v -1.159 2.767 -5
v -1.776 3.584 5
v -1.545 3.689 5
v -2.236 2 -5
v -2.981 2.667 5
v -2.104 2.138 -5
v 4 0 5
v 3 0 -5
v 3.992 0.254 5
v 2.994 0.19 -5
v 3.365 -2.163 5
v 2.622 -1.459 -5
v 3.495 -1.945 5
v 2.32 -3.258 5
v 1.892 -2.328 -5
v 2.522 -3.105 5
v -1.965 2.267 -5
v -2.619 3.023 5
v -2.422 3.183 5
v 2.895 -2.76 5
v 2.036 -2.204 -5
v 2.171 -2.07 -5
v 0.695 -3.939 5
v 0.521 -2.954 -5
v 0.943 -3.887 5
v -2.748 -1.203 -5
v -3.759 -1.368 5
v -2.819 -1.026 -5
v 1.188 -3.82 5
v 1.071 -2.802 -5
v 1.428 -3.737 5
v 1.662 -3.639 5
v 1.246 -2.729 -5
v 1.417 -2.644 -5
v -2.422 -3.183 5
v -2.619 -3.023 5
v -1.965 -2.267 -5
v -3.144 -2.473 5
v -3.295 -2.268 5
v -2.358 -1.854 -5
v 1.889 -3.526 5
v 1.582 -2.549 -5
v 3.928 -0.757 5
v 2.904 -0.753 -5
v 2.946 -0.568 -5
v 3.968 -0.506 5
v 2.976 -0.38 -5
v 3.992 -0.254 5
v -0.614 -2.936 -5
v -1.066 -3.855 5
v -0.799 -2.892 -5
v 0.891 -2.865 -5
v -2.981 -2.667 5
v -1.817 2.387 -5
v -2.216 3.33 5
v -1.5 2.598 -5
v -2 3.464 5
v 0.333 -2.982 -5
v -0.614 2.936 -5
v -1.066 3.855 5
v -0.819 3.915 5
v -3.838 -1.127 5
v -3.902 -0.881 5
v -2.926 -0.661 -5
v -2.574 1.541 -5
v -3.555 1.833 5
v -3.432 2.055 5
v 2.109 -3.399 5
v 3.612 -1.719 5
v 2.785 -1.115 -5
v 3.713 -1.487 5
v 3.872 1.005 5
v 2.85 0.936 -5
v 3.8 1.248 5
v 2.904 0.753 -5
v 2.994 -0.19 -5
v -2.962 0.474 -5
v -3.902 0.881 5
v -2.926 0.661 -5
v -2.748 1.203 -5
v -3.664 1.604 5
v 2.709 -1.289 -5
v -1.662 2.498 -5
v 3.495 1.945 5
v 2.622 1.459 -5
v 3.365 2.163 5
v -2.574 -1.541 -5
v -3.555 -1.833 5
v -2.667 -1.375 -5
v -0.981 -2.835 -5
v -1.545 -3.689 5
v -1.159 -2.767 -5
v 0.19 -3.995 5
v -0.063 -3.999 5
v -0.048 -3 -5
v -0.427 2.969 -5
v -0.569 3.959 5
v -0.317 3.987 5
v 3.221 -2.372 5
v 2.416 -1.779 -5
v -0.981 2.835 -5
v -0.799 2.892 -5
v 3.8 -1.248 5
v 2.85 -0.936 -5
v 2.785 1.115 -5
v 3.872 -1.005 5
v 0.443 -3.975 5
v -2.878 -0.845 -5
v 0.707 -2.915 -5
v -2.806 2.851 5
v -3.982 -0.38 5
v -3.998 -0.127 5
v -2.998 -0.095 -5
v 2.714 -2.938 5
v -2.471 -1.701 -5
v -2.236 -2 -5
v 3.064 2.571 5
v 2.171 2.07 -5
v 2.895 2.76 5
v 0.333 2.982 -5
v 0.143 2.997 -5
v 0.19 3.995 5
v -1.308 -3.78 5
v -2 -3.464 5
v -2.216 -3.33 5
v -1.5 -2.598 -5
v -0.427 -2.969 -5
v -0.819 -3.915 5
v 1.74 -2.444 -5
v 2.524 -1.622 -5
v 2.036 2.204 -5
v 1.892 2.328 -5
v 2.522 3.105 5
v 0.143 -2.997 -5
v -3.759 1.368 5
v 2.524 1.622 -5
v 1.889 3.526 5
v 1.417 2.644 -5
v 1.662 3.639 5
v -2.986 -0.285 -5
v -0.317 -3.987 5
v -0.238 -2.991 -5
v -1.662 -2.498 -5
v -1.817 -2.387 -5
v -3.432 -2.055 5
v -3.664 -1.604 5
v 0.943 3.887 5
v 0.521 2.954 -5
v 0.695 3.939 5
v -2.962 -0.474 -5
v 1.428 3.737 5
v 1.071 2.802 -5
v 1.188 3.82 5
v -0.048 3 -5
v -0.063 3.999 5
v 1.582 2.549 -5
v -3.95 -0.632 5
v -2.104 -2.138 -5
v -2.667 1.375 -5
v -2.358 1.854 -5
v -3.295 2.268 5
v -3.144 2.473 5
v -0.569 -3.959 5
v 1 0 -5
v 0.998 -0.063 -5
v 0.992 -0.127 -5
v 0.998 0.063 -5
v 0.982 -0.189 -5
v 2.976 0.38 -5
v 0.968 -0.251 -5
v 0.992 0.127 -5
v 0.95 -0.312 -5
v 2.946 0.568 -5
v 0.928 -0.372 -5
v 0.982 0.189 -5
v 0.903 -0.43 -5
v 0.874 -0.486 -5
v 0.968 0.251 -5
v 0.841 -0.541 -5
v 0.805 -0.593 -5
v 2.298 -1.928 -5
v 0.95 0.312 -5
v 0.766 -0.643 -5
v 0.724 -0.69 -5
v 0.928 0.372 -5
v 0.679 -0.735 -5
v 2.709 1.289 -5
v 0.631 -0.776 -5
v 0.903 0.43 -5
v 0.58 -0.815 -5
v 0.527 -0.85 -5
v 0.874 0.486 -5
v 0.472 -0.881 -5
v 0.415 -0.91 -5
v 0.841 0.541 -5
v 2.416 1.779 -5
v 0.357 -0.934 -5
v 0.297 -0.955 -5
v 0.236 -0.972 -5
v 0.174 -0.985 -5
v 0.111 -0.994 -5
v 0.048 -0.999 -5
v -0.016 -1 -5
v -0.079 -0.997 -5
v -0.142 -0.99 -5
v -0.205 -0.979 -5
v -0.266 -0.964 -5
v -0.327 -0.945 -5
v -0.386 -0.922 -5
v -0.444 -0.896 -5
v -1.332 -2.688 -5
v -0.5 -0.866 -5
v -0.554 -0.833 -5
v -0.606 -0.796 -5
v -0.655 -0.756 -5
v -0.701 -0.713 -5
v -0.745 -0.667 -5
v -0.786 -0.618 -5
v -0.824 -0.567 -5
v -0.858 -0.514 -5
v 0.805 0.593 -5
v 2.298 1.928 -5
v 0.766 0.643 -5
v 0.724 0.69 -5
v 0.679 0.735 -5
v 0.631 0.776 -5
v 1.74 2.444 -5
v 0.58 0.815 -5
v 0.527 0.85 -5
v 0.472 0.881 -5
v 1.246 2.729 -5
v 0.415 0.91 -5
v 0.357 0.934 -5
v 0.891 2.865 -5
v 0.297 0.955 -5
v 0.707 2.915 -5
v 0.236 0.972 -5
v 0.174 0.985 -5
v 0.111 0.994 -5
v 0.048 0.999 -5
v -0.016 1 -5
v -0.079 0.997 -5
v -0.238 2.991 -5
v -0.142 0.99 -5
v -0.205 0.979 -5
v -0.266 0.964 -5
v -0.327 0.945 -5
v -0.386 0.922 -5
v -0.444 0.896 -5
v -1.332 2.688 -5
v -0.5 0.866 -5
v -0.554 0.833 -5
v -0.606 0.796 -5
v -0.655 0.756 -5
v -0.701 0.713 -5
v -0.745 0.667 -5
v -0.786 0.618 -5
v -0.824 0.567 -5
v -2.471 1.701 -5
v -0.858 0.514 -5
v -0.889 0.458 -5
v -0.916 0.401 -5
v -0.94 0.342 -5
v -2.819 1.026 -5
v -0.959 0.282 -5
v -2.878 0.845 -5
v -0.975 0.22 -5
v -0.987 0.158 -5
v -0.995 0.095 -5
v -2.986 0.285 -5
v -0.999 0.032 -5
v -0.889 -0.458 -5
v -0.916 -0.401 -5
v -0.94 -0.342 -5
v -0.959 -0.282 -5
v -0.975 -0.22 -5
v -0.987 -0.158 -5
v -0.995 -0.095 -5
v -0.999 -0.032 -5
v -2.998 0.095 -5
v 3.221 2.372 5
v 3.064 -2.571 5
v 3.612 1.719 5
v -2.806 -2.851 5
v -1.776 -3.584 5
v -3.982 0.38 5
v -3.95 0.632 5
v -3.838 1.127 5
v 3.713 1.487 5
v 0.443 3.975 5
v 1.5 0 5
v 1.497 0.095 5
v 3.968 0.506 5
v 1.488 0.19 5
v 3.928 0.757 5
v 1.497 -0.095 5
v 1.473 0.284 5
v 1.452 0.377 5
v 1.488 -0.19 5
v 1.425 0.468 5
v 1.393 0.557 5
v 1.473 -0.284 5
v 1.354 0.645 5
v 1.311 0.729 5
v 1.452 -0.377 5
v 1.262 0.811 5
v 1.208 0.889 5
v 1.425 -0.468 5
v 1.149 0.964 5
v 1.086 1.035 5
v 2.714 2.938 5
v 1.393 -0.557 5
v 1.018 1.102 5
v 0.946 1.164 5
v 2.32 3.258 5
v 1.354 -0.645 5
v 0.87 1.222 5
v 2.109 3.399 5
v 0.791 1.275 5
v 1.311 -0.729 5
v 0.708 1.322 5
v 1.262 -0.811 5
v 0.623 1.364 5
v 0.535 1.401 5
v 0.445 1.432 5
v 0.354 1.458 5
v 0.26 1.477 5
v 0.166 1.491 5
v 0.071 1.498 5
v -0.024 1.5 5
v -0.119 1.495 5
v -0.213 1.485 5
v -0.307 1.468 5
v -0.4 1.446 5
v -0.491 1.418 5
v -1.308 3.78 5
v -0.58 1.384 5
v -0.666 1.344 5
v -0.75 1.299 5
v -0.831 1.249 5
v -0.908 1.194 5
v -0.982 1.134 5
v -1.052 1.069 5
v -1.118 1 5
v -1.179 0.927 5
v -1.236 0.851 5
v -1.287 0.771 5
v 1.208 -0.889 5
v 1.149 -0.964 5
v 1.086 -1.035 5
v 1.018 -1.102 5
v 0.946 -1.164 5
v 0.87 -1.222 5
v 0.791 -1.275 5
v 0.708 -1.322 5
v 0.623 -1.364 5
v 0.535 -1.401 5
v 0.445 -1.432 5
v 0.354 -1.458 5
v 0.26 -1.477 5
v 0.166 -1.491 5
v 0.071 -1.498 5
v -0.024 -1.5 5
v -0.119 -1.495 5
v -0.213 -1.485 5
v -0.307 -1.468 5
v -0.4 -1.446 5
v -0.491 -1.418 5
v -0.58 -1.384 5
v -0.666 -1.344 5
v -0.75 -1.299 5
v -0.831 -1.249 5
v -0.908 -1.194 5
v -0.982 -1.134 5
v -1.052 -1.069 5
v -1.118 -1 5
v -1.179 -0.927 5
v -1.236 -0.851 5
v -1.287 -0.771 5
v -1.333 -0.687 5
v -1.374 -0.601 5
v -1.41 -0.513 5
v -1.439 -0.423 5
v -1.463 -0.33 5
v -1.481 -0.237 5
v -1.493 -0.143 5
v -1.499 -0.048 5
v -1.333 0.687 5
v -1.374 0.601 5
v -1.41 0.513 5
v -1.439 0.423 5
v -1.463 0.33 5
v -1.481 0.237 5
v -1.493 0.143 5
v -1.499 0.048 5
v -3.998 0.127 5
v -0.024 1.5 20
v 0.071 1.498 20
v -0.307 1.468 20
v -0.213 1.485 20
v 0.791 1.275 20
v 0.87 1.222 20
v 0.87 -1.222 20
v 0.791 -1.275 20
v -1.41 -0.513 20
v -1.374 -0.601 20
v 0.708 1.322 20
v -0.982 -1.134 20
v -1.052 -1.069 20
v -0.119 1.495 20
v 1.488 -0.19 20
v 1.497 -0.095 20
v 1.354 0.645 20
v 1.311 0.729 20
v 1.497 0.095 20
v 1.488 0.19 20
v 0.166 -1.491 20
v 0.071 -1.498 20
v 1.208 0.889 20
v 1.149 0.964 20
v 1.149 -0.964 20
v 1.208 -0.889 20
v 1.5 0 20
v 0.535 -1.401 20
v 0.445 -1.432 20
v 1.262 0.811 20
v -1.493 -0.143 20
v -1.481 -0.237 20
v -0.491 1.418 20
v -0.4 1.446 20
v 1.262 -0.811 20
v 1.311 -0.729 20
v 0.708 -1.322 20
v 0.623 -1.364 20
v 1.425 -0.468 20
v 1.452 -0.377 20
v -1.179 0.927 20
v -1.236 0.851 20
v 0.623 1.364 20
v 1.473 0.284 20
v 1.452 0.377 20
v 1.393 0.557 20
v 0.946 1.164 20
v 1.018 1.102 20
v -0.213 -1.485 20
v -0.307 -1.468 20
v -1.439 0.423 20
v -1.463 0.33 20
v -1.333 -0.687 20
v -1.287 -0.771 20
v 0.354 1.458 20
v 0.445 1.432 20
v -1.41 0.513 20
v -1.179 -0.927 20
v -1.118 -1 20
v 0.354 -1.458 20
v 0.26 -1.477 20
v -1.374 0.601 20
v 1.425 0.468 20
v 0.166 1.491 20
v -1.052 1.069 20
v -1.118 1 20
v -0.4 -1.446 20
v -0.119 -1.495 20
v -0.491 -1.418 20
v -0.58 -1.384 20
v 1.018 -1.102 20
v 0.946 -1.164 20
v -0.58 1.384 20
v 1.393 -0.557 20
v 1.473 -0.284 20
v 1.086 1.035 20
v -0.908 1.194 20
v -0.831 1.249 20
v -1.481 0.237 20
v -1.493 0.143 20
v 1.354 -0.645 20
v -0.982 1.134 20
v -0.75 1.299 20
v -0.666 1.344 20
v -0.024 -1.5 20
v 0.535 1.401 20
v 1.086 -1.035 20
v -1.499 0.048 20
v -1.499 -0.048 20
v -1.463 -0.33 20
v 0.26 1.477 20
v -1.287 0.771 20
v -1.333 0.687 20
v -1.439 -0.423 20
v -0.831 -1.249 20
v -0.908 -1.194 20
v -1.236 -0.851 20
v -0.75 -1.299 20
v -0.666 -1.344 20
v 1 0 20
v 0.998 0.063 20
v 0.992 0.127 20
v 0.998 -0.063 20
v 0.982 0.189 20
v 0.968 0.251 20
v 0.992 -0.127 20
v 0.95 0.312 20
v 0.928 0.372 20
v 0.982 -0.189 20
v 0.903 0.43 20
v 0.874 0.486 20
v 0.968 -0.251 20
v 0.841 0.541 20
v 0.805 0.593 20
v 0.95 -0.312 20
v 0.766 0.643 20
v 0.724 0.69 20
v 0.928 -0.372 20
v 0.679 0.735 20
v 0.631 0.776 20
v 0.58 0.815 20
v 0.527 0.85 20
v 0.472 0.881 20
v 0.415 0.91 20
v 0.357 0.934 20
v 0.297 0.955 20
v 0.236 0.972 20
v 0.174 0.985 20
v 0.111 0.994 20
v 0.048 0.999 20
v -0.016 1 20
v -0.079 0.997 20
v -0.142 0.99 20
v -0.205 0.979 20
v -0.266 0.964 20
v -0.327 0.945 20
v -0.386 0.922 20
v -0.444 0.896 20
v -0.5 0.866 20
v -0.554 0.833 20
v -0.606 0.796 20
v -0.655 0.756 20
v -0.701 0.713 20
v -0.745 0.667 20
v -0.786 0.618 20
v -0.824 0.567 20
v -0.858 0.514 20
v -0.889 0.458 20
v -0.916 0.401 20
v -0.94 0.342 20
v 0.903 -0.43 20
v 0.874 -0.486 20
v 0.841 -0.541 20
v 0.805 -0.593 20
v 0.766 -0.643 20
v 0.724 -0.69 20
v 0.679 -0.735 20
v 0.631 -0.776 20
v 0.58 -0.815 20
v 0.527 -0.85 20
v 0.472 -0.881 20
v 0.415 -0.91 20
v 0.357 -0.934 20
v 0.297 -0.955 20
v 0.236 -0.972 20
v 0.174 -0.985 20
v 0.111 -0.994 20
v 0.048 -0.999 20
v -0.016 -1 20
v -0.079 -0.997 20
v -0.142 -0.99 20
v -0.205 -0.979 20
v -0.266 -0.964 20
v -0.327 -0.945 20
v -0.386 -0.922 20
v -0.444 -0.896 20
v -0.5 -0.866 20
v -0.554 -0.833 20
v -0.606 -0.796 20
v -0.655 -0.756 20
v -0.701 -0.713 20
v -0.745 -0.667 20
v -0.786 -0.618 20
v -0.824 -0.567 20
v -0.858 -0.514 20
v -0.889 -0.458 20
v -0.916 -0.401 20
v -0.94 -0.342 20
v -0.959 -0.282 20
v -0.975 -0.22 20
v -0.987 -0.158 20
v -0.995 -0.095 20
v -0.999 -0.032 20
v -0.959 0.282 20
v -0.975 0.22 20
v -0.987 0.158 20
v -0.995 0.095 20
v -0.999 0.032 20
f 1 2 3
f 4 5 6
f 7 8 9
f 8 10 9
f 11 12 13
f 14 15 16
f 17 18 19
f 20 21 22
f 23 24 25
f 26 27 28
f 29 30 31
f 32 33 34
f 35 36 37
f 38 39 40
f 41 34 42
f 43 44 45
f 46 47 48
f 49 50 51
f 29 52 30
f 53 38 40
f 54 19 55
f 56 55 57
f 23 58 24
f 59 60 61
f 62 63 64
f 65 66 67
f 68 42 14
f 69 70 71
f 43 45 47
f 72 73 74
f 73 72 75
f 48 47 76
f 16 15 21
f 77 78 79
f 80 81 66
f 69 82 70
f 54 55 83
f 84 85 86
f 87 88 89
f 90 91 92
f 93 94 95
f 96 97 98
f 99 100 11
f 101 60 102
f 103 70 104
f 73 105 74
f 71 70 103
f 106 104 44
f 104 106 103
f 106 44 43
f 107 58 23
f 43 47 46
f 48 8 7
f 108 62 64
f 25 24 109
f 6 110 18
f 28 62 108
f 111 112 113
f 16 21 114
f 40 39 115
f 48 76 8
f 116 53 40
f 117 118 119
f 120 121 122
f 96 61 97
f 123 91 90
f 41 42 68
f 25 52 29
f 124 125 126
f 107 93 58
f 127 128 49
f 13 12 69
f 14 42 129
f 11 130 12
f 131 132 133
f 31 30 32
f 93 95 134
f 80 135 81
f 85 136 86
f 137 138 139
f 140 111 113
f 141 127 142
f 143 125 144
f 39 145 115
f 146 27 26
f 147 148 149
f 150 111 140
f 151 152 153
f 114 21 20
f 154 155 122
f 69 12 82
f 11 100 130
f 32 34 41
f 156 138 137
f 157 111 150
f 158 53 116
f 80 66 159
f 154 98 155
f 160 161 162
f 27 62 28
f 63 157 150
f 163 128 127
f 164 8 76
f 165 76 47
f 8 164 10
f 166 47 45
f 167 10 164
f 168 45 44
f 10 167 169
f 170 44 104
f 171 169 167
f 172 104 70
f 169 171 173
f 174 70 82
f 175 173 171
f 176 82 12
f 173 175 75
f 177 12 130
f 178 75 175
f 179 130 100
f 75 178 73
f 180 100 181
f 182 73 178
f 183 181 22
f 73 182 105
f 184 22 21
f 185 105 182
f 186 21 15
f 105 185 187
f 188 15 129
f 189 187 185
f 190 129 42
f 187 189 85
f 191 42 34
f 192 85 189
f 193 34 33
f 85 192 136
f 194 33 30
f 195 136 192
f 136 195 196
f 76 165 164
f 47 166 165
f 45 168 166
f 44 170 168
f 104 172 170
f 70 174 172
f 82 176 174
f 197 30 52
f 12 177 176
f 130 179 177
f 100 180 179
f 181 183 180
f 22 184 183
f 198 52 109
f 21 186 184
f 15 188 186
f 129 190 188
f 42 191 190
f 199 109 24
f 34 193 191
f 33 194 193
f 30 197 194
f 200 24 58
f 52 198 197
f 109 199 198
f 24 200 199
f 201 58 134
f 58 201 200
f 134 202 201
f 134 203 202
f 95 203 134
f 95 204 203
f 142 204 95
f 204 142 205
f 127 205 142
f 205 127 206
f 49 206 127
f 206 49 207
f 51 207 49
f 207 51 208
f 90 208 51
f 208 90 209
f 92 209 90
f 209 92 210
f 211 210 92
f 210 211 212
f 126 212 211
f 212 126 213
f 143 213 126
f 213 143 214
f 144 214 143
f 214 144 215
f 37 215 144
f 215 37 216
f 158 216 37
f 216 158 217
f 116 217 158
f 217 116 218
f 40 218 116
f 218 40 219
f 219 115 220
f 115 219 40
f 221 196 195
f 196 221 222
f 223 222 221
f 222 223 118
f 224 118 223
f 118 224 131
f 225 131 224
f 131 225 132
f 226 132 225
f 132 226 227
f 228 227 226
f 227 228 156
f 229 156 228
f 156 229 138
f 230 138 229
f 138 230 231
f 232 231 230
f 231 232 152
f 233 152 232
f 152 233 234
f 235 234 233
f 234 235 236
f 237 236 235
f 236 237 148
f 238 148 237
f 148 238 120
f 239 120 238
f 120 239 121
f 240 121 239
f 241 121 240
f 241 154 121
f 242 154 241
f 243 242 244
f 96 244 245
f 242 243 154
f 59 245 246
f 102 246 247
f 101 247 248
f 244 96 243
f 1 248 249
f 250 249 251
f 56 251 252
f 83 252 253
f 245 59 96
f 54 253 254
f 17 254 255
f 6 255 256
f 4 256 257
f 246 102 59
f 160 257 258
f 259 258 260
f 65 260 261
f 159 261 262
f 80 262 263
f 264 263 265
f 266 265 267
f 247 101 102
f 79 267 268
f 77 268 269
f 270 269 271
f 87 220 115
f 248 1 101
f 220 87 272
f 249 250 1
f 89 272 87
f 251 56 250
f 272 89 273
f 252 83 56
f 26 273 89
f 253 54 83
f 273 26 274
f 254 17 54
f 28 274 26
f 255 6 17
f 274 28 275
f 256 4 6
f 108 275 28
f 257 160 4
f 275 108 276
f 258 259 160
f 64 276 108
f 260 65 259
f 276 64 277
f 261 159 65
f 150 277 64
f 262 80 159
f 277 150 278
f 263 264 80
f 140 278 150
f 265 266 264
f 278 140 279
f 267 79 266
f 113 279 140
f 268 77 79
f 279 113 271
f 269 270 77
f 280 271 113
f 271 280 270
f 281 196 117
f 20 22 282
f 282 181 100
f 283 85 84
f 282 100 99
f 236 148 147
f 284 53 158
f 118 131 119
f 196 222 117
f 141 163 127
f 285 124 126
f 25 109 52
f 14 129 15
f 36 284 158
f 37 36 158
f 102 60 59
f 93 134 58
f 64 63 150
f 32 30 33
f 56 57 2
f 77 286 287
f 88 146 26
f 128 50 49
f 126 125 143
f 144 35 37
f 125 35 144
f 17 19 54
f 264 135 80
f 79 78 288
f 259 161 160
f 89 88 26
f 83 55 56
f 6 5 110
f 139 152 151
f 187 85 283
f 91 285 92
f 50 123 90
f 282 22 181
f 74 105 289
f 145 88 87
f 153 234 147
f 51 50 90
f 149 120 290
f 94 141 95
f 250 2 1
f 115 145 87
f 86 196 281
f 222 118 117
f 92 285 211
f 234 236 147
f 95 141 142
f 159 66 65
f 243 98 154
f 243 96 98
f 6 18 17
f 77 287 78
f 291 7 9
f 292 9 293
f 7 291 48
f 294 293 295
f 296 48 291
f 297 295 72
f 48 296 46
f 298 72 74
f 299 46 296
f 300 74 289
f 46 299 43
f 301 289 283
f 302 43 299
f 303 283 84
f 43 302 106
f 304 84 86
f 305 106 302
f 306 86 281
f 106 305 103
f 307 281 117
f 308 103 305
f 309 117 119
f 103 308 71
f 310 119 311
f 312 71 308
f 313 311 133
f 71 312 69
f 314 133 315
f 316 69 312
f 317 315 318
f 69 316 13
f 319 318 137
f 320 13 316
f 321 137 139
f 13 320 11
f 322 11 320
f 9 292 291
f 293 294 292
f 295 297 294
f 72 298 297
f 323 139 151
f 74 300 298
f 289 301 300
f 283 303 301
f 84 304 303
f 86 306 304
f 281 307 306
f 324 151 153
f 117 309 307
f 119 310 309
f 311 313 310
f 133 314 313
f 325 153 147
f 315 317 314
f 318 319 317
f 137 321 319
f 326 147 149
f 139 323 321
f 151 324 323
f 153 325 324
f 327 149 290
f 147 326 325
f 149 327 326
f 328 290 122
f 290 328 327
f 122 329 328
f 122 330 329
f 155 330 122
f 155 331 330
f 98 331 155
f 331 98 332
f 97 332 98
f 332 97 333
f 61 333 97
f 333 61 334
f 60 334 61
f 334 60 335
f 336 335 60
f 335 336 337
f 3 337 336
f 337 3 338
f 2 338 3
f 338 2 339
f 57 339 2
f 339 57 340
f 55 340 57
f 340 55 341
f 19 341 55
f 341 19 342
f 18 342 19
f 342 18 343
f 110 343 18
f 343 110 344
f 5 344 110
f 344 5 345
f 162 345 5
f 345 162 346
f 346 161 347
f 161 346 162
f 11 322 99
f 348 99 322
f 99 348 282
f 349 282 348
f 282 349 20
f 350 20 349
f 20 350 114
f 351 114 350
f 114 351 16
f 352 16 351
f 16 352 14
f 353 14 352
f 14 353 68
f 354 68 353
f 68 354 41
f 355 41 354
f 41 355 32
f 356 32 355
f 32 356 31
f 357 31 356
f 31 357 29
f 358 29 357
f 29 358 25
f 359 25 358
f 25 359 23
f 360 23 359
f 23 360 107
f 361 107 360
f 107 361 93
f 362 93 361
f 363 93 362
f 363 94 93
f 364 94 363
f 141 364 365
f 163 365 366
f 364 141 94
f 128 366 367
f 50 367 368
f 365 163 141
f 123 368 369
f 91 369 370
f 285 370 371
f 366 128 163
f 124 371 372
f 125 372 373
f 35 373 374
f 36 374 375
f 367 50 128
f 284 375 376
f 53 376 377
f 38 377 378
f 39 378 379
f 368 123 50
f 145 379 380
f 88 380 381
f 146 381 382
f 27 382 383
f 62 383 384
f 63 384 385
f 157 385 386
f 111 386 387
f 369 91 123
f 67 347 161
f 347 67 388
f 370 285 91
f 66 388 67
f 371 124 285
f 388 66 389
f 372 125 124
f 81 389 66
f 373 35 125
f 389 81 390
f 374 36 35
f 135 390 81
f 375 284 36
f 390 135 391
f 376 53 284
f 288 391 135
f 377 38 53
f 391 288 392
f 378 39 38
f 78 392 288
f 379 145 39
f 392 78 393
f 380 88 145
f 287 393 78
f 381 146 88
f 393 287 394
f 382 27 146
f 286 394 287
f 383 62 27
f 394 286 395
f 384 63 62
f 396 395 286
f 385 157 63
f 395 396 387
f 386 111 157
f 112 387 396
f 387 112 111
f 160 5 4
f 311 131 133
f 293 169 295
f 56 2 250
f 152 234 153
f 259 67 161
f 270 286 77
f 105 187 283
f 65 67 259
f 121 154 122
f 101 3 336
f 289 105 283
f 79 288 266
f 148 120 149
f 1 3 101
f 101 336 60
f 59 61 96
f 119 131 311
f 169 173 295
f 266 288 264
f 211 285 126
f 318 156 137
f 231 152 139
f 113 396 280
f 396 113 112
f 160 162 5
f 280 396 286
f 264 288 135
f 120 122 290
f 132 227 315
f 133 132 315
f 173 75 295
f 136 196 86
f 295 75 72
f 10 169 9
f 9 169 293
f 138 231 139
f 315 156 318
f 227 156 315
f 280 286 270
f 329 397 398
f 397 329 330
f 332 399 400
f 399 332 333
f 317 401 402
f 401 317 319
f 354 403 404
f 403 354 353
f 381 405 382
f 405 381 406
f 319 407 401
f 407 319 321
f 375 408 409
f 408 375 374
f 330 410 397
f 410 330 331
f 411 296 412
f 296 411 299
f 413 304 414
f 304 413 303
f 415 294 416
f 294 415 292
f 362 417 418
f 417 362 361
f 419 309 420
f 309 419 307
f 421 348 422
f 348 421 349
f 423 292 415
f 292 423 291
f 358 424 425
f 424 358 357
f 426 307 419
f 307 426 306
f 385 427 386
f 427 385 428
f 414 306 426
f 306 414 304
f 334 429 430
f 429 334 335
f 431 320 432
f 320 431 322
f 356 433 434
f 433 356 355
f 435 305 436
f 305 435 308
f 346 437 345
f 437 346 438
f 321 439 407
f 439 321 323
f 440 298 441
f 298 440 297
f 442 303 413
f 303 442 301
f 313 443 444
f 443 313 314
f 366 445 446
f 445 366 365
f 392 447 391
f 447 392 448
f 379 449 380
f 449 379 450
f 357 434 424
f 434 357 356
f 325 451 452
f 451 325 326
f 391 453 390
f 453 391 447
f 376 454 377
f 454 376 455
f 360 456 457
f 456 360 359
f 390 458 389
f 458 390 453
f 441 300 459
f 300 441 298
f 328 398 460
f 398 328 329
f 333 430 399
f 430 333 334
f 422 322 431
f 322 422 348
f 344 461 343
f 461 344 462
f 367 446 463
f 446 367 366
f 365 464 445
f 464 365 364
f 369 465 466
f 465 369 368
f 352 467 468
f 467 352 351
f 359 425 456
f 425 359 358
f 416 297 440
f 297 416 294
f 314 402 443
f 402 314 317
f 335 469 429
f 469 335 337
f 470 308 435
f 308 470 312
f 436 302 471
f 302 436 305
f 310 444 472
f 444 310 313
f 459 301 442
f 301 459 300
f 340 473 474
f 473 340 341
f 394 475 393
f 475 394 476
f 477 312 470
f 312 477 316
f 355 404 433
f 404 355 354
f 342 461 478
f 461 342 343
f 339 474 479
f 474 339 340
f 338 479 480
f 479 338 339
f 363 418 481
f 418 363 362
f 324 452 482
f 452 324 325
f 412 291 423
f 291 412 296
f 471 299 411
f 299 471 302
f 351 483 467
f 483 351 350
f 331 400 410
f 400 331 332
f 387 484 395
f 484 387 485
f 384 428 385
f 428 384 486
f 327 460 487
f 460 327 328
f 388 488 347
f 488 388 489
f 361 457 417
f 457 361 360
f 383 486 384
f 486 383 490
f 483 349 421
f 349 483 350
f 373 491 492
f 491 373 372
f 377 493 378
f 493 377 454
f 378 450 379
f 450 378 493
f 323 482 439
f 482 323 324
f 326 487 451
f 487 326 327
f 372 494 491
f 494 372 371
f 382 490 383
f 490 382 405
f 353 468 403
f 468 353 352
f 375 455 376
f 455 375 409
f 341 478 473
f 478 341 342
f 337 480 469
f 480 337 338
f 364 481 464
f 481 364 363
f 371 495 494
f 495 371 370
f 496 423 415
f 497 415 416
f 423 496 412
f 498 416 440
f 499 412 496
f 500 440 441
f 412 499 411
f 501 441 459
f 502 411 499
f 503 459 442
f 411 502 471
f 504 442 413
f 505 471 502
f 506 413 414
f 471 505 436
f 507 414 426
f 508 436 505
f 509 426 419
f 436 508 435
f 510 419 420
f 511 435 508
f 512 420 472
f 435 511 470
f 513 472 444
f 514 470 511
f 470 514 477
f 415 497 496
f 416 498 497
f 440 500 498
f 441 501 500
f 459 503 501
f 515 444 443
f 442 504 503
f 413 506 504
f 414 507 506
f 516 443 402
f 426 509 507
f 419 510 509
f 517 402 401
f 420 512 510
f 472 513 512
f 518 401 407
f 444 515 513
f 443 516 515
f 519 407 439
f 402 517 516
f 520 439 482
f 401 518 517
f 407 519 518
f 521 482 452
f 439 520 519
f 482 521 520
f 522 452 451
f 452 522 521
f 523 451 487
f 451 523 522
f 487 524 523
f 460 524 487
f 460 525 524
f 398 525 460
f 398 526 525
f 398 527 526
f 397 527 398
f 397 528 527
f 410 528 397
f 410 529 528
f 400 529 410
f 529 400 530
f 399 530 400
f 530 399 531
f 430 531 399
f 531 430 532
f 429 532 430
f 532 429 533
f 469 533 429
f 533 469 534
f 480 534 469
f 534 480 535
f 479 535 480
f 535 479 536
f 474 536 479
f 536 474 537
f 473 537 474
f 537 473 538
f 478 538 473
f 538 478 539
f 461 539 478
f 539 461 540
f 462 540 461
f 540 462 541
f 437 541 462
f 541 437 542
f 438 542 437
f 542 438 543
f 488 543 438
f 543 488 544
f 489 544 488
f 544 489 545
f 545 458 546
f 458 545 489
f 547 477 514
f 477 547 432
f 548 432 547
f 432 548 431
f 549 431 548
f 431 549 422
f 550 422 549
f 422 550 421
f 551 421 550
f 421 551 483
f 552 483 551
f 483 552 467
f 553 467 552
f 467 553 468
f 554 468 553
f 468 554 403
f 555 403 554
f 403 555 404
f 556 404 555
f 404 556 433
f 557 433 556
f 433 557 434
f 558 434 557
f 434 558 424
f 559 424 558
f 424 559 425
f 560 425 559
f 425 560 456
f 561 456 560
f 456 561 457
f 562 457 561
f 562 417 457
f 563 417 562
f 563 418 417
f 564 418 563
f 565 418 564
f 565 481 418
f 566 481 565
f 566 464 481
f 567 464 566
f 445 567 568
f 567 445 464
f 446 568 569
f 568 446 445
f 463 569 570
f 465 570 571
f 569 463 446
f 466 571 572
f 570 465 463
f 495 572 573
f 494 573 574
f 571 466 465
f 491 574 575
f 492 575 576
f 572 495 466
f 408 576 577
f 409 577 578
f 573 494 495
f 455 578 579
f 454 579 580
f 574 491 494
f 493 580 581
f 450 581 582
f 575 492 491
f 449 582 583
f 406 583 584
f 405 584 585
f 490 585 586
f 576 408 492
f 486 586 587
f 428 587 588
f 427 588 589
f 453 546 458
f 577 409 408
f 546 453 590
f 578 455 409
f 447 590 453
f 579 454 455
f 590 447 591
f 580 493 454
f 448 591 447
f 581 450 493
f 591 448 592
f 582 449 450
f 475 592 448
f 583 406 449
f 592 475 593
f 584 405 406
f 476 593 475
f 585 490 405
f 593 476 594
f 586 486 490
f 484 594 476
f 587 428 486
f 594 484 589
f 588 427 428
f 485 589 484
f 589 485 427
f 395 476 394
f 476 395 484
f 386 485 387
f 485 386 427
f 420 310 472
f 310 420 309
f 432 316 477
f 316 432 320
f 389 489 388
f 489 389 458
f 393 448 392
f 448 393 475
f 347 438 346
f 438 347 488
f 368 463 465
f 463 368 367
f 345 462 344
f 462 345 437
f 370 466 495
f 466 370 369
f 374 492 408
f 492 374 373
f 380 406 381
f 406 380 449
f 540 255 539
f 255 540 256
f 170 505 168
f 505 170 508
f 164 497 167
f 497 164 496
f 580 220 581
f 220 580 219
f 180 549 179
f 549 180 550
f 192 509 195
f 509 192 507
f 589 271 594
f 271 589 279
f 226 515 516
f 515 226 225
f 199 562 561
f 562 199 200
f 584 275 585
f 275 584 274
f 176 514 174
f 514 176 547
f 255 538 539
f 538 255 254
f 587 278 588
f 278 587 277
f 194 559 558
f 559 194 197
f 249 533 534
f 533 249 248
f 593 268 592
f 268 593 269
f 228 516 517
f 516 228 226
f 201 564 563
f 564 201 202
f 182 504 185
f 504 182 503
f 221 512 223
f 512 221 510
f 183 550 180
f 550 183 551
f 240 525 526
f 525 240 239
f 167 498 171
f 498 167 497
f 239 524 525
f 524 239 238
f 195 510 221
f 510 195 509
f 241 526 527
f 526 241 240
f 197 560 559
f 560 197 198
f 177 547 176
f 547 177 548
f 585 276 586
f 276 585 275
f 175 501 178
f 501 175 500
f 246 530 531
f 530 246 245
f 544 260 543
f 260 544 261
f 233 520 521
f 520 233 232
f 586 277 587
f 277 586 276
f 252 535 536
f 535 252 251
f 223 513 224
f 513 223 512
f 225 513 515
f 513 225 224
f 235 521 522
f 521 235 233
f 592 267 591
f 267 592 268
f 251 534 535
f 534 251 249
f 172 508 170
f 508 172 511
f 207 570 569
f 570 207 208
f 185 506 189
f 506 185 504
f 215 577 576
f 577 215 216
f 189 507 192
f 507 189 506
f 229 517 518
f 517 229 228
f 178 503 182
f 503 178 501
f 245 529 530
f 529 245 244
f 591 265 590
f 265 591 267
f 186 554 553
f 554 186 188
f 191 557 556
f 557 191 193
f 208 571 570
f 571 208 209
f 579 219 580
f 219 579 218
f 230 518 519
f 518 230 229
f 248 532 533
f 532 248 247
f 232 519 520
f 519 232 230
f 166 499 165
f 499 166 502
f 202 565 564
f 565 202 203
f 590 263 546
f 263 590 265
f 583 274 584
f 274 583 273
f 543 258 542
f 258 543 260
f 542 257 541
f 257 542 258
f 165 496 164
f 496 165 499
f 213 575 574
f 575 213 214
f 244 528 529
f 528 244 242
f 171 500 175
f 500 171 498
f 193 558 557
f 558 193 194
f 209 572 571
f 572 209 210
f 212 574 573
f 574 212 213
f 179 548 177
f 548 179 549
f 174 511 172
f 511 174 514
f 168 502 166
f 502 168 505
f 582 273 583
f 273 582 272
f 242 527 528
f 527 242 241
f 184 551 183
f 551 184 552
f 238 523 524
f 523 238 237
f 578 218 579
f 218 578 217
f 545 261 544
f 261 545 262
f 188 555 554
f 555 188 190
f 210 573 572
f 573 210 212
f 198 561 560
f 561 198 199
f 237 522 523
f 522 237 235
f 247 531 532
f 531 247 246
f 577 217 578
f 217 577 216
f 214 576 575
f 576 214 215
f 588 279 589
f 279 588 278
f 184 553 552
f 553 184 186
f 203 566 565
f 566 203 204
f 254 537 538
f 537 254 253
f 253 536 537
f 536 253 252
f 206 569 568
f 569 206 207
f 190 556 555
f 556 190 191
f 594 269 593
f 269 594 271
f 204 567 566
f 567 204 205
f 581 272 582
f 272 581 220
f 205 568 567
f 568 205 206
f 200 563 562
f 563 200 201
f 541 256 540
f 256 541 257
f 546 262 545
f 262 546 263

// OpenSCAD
$fn = 99; 

difference() {
  union() {
    cylinder( r1=3, r2=4, h=10, center=true );
    translate([0,0,10]) cylinder( r=1.5, h=20, center=true ); 
  }
  cylinder( r=1, h=100, center=true ); 
}
